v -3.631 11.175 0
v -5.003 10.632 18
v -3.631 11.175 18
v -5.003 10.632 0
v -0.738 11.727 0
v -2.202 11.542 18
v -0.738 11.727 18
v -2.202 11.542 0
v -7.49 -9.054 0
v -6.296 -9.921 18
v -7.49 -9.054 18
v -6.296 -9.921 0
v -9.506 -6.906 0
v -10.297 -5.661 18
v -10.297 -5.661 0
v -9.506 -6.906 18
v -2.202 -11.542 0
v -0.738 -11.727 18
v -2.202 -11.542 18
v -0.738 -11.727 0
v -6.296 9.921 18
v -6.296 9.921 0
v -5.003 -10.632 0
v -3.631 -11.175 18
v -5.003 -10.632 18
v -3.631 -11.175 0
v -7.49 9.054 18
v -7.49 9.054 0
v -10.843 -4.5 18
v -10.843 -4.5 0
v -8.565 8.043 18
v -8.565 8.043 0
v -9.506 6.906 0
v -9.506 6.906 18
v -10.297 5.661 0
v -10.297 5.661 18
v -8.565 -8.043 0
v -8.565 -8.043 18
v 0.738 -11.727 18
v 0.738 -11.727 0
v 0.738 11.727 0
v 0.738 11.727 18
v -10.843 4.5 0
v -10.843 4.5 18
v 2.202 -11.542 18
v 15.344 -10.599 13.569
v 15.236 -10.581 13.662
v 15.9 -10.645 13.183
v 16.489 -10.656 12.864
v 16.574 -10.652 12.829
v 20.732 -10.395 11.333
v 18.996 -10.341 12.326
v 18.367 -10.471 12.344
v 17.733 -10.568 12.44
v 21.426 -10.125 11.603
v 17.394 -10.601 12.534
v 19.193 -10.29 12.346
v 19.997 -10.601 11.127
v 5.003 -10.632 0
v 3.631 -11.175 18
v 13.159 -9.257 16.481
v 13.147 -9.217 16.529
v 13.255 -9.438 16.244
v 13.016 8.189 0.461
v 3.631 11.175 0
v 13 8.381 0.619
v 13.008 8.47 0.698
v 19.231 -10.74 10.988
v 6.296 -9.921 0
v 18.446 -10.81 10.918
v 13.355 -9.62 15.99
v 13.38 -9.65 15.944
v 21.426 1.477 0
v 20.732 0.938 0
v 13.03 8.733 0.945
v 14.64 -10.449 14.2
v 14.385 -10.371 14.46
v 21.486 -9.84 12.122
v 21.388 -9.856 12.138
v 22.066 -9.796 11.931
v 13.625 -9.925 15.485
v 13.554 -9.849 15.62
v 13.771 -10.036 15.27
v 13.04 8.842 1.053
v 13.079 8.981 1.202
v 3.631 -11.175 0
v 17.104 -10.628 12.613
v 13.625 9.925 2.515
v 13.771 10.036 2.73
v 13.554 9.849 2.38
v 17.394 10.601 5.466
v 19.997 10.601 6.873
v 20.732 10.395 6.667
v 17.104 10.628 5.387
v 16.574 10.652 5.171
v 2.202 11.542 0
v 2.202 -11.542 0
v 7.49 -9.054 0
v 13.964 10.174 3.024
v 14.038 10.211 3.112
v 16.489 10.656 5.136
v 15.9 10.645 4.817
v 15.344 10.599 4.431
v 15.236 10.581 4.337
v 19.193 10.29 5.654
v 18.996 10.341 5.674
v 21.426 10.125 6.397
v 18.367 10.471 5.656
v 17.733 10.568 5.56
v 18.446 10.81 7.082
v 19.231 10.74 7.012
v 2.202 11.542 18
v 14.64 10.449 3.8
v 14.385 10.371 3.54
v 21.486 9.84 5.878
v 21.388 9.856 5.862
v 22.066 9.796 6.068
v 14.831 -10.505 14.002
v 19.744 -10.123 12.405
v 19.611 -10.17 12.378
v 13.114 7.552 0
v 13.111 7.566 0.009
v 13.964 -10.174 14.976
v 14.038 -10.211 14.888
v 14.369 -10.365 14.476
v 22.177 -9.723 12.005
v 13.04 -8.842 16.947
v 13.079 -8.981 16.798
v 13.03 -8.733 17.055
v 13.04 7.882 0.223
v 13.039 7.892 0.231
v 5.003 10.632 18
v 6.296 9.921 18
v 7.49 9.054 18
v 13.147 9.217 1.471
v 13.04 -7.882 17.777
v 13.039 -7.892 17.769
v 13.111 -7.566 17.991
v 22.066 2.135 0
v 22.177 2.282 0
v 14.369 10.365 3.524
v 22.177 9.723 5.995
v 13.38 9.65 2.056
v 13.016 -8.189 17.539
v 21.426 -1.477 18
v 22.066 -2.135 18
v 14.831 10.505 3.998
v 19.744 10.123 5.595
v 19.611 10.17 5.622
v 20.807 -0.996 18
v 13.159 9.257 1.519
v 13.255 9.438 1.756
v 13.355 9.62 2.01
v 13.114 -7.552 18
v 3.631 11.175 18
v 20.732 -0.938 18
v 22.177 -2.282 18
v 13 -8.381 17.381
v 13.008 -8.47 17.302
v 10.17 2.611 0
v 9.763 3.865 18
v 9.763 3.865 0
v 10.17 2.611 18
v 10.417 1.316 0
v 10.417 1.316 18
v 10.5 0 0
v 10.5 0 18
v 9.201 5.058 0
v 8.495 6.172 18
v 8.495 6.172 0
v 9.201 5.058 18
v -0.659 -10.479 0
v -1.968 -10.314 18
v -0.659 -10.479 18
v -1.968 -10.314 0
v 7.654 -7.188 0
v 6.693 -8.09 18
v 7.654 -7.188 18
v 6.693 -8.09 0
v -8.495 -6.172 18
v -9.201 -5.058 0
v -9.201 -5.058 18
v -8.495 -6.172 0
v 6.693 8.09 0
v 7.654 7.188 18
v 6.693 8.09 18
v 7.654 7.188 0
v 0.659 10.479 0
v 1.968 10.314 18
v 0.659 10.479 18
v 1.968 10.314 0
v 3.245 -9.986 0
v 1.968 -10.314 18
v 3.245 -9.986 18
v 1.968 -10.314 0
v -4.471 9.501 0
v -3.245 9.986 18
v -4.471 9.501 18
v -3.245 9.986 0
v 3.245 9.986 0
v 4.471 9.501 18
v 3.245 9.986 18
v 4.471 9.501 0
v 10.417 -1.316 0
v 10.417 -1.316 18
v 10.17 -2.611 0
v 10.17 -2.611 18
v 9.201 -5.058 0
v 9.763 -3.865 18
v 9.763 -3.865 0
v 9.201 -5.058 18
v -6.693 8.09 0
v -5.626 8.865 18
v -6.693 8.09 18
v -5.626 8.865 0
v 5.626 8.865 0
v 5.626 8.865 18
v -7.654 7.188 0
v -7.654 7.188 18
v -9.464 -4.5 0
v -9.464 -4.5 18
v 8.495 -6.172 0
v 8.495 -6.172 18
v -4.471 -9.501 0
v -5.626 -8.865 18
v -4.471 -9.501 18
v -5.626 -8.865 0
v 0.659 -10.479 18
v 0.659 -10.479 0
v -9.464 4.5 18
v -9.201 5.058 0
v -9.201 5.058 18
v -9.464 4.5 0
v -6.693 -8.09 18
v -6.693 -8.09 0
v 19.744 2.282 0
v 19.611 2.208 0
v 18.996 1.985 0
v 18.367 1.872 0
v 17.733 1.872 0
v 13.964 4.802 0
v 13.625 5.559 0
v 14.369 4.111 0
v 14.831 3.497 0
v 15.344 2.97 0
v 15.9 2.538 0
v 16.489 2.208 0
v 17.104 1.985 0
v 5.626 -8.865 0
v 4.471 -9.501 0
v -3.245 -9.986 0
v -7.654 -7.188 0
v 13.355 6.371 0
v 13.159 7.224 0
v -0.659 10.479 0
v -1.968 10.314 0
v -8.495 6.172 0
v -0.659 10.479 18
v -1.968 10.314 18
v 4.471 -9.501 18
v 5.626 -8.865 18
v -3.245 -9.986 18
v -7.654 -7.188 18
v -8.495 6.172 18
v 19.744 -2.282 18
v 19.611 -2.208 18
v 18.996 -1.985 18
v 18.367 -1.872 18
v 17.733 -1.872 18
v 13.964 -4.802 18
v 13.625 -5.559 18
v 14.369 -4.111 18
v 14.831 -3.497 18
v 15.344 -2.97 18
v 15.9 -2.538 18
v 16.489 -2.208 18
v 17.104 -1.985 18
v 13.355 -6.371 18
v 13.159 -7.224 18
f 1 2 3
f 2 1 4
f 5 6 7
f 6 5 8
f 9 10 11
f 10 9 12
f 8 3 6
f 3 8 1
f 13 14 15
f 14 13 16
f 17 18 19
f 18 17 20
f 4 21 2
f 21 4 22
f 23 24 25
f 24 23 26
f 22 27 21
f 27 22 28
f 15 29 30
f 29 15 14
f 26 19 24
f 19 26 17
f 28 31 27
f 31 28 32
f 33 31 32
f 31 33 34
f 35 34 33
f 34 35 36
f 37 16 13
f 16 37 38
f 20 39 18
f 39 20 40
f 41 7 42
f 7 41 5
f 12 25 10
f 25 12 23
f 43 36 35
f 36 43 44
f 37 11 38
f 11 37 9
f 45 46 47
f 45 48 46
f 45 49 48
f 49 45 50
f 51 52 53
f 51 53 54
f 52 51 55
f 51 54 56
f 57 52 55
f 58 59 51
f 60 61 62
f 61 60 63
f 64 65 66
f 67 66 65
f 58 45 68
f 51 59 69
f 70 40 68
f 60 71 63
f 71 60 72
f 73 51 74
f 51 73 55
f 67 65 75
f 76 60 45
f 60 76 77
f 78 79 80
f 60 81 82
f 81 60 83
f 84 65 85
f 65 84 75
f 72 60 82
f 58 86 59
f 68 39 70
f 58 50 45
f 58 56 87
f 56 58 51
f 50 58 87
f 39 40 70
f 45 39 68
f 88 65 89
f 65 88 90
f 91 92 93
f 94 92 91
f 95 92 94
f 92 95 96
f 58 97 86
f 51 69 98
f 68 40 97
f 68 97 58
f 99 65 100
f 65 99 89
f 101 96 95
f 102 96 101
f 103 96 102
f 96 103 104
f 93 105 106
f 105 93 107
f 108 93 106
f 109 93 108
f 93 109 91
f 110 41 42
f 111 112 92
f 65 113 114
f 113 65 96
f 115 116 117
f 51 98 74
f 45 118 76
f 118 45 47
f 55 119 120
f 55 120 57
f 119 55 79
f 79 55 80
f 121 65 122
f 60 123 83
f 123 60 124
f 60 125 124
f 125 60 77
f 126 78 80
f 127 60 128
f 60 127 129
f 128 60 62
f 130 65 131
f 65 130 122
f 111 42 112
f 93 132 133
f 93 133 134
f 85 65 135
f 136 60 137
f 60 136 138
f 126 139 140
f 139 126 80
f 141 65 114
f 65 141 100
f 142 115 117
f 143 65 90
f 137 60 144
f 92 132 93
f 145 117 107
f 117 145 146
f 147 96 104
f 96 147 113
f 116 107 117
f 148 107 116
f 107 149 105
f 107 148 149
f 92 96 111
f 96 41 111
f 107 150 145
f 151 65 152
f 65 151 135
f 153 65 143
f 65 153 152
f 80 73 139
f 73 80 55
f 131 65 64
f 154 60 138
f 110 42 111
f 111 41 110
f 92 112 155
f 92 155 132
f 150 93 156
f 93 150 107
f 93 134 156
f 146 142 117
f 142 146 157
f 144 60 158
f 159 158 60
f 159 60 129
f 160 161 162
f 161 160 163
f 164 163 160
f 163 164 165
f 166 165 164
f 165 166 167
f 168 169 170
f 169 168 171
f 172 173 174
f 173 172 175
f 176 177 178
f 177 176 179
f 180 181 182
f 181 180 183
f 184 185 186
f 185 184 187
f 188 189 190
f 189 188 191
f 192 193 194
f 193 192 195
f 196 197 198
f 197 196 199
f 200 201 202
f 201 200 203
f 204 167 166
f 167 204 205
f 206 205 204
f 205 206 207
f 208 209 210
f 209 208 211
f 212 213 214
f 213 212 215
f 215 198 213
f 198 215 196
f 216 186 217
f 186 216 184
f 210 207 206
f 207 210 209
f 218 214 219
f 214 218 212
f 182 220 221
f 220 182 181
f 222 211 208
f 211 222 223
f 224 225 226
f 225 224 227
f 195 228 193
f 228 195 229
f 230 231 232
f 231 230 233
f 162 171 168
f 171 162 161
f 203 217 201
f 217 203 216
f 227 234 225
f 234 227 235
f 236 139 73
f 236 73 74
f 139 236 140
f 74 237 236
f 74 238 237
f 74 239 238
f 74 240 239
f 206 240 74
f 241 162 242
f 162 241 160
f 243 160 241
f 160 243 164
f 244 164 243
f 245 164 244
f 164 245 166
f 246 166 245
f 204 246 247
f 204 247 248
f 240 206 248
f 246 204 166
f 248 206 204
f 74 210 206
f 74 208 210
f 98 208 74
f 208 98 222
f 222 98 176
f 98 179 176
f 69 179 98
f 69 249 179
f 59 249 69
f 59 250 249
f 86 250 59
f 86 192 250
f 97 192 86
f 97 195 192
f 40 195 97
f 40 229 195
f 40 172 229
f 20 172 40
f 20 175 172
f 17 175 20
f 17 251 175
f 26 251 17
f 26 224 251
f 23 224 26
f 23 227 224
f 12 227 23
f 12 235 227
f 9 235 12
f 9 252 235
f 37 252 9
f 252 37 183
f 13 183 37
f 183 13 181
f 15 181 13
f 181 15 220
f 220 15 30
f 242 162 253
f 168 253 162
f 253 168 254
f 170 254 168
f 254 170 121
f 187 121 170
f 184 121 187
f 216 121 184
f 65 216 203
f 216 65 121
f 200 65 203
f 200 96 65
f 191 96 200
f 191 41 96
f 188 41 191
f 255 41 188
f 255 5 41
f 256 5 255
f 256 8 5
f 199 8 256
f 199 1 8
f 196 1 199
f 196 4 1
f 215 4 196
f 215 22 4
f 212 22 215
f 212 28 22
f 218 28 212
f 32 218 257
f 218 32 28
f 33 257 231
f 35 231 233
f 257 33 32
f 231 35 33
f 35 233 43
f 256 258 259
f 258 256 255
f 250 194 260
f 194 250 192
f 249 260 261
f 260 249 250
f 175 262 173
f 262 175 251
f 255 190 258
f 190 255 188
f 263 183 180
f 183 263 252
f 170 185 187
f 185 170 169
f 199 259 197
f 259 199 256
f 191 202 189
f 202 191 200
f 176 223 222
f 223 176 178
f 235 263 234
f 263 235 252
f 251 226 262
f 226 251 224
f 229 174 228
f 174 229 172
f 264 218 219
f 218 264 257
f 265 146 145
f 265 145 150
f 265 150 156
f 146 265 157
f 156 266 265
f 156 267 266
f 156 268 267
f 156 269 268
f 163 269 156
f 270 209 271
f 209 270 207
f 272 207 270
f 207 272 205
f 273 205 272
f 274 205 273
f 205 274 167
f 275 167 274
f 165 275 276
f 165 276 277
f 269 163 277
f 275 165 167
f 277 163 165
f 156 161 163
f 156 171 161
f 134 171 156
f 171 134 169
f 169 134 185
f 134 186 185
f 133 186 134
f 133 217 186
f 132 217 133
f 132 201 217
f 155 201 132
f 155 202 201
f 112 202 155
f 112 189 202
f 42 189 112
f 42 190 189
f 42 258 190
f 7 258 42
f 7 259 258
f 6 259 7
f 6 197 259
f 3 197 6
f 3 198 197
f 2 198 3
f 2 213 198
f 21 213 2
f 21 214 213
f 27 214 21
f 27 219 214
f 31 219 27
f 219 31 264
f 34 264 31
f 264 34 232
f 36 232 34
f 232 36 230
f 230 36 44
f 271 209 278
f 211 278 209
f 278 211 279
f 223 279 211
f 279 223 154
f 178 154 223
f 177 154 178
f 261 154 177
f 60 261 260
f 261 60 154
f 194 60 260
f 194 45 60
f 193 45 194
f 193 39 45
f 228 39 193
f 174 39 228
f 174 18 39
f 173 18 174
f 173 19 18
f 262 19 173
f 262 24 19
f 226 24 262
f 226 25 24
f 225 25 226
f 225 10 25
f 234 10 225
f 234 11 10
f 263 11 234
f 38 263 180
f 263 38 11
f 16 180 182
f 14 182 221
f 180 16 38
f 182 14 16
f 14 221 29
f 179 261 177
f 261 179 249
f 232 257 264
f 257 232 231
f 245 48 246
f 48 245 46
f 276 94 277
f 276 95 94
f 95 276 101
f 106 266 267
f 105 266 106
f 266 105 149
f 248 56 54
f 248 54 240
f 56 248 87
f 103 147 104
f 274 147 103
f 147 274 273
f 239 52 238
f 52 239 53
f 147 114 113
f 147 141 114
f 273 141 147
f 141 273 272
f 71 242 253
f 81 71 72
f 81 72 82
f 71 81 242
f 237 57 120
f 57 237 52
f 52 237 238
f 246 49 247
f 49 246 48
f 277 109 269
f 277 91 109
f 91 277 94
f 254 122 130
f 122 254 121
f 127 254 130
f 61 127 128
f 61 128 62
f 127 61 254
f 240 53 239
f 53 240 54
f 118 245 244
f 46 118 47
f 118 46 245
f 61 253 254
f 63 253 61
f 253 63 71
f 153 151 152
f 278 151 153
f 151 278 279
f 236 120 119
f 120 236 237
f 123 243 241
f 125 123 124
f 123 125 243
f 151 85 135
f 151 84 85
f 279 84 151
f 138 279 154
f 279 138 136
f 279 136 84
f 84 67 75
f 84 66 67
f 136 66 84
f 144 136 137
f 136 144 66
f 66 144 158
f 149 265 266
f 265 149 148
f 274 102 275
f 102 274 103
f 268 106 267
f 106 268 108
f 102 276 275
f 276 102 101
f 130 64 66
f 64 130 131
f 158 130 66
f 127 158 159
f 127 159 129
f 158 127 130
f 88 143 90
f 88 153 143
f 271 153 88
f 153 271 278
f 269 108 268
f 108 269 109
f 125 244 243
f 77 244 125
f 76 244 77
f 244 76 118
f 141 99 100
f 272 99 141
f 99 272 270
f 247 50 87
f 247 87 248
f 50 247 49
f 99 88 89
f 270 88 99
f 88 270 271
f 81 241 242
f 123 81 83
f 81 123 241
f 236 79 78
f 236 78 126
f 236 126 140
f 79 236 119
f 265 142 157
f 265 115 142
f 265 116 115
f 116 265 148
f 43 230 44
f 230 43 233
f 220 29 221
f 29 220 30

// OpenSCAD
/////////////////////////////////////////////////////////////////
//Remix by W. Englert 12/02/2018/////////////////////////////////
//Finger_Pen_Holder_V2.0_OpenSCAD////////////////////////////////
//Maker's Making Change /////////////////////////////////////////
//http://www.makersmakingchange.com//////////////////////////////
//Remix of Finger Pen Holder (Vertical) by makersmakingchange////
//Published on February 28, 2018/////////////////////////////////
//www.thingiverse.com/thing:2802074//////////////////////////////


/*[variables]*/

//Length of the Ring
Ring_L = 18.0; // [10:0.5:40]

//Ring hole size (mm)
Ring_HD = 21.0; // [10:0.5:40]

//Ring Edge Cutout (mm)
Ring_C =9.0; // [0:0.5:40]

//Thickness of the Ring (mm)
Ring_T = 2.5; // [2:0.1:4]

//Length of the pen holder (mm)
Pen_L = 18; // [10:0.5:40]

//Pen hole size (mm)
Pen_HD = 10.1; // [1:0.1:40]

//Pen Edge Cutout
Pen_C = 9.5; // [0:0.1:40]

//Thickness of Pen holder
Pen_T = 2.5; // [2:0.1:4]

//Angle of Pen holder (degrees)
Pen_A =45; // [0:1:359]

//Additional distance from ring to pen
Distance = 0;// [0:0.5:40]

/*[Hidden]*/
//Total width for top and bottom trimming
Total_W = Ring_HD+(Ring_T*2)+(Pen_HD*2)+(Pen_T*2)+(Distance*2);

//facet Number
$fn=50;


//////////////////////////////////////////////////////////
//////////////////////////////////////////////////////////
//Renders
difference(){
Outer_Structure();
holes();
}


//////////////////////////////////////////////////////////
//////////////////////////////////////////////////////////

//modules

module Outer_Structure (){
//Ring Outer
    cylinder(d1=Ring_T+Ring_HD,d2=Ring_T+Ring_HD, h=Ring_L);

//Ring and Pen outer structure    
hull(){
//hull attachment point on the ring
    cylinder(d1=Ring_T+Ring_HD,d2=Ring_T+Ring_HD, h=Pen_L);

// Pen holder Outer    
    translate([(Ring_HD*0.5)+(Pen_HD*0.5)+(Ring_T*0.5)+(Pen_T*0.5)+Distance,0,(Pen_L*.5)])rotate([Pen_A,0,0]){
    cylinder(d1=Pen_HD + Pen_T,d2=Pen_HD + Pen_T,h=Pen_L, center=true);}
}
}
module holes(){
// Ring Hole
    cylinder(d1=Ring_HD, d2=Ring_HD, h=Ring_L);
    
// Pen Hole    
    translate([(Ring_HD*0.5)+(Pen_HD*0.5)+(Ring_T*0.5)+(Pen_T*0.5)+Distance,0,(Pen_L*.5)])rotate([Pen_A,0,0]){
    cylinder(d1=Pen_HD,d2=Pen_HD,h=Pen_L*2, center=true);}

// Cutout for Pen Hole   
    translate([(Ring_HD*0.5)+(Pen_HD)+(Ring_T*0.5)+(Pen_T*0.5)+Distance,0,Pen_L*.5])rotate([Pen_A,0,0]){
    cube([Pen_HD,Pen_C,Pen_L*2],center=true);}

// Cutout for Ring Hole    
    translate([-Ring_HD,-Ring_C*.5,0])cube([Ring_HD,Ring_C,Ring_L]);

// Trim Bottom of device Flush with Table    
    translate([0,0,-Ring_L])cylinder(d1=Total_W,d2=Total_W,h=Ring_L);

// Trim Top of device Flush    
    translate([0,0,Ring_L])cylinder(d1=Total_W,d2=Total_W,h=Ring_L);
}

/////////////////////////////////////////////////////////////////
//Remix by W. Englert 12/02/2018/////////////////////////////////
//Finger_Pen_Holder_V2.0_OpenSCAD////////////////////////////////
//Maker's Making Change /////////////////////////////////////////
//http://www.makersmakingchange.com//////////////////////////////
//Remix of Finger Pen Holder (Vertical) by makersmakingchange////
//Published on February 28, 2018/////////////////////////////////
//www.thingiverse.com/thing:2802074//////////////////////////////
